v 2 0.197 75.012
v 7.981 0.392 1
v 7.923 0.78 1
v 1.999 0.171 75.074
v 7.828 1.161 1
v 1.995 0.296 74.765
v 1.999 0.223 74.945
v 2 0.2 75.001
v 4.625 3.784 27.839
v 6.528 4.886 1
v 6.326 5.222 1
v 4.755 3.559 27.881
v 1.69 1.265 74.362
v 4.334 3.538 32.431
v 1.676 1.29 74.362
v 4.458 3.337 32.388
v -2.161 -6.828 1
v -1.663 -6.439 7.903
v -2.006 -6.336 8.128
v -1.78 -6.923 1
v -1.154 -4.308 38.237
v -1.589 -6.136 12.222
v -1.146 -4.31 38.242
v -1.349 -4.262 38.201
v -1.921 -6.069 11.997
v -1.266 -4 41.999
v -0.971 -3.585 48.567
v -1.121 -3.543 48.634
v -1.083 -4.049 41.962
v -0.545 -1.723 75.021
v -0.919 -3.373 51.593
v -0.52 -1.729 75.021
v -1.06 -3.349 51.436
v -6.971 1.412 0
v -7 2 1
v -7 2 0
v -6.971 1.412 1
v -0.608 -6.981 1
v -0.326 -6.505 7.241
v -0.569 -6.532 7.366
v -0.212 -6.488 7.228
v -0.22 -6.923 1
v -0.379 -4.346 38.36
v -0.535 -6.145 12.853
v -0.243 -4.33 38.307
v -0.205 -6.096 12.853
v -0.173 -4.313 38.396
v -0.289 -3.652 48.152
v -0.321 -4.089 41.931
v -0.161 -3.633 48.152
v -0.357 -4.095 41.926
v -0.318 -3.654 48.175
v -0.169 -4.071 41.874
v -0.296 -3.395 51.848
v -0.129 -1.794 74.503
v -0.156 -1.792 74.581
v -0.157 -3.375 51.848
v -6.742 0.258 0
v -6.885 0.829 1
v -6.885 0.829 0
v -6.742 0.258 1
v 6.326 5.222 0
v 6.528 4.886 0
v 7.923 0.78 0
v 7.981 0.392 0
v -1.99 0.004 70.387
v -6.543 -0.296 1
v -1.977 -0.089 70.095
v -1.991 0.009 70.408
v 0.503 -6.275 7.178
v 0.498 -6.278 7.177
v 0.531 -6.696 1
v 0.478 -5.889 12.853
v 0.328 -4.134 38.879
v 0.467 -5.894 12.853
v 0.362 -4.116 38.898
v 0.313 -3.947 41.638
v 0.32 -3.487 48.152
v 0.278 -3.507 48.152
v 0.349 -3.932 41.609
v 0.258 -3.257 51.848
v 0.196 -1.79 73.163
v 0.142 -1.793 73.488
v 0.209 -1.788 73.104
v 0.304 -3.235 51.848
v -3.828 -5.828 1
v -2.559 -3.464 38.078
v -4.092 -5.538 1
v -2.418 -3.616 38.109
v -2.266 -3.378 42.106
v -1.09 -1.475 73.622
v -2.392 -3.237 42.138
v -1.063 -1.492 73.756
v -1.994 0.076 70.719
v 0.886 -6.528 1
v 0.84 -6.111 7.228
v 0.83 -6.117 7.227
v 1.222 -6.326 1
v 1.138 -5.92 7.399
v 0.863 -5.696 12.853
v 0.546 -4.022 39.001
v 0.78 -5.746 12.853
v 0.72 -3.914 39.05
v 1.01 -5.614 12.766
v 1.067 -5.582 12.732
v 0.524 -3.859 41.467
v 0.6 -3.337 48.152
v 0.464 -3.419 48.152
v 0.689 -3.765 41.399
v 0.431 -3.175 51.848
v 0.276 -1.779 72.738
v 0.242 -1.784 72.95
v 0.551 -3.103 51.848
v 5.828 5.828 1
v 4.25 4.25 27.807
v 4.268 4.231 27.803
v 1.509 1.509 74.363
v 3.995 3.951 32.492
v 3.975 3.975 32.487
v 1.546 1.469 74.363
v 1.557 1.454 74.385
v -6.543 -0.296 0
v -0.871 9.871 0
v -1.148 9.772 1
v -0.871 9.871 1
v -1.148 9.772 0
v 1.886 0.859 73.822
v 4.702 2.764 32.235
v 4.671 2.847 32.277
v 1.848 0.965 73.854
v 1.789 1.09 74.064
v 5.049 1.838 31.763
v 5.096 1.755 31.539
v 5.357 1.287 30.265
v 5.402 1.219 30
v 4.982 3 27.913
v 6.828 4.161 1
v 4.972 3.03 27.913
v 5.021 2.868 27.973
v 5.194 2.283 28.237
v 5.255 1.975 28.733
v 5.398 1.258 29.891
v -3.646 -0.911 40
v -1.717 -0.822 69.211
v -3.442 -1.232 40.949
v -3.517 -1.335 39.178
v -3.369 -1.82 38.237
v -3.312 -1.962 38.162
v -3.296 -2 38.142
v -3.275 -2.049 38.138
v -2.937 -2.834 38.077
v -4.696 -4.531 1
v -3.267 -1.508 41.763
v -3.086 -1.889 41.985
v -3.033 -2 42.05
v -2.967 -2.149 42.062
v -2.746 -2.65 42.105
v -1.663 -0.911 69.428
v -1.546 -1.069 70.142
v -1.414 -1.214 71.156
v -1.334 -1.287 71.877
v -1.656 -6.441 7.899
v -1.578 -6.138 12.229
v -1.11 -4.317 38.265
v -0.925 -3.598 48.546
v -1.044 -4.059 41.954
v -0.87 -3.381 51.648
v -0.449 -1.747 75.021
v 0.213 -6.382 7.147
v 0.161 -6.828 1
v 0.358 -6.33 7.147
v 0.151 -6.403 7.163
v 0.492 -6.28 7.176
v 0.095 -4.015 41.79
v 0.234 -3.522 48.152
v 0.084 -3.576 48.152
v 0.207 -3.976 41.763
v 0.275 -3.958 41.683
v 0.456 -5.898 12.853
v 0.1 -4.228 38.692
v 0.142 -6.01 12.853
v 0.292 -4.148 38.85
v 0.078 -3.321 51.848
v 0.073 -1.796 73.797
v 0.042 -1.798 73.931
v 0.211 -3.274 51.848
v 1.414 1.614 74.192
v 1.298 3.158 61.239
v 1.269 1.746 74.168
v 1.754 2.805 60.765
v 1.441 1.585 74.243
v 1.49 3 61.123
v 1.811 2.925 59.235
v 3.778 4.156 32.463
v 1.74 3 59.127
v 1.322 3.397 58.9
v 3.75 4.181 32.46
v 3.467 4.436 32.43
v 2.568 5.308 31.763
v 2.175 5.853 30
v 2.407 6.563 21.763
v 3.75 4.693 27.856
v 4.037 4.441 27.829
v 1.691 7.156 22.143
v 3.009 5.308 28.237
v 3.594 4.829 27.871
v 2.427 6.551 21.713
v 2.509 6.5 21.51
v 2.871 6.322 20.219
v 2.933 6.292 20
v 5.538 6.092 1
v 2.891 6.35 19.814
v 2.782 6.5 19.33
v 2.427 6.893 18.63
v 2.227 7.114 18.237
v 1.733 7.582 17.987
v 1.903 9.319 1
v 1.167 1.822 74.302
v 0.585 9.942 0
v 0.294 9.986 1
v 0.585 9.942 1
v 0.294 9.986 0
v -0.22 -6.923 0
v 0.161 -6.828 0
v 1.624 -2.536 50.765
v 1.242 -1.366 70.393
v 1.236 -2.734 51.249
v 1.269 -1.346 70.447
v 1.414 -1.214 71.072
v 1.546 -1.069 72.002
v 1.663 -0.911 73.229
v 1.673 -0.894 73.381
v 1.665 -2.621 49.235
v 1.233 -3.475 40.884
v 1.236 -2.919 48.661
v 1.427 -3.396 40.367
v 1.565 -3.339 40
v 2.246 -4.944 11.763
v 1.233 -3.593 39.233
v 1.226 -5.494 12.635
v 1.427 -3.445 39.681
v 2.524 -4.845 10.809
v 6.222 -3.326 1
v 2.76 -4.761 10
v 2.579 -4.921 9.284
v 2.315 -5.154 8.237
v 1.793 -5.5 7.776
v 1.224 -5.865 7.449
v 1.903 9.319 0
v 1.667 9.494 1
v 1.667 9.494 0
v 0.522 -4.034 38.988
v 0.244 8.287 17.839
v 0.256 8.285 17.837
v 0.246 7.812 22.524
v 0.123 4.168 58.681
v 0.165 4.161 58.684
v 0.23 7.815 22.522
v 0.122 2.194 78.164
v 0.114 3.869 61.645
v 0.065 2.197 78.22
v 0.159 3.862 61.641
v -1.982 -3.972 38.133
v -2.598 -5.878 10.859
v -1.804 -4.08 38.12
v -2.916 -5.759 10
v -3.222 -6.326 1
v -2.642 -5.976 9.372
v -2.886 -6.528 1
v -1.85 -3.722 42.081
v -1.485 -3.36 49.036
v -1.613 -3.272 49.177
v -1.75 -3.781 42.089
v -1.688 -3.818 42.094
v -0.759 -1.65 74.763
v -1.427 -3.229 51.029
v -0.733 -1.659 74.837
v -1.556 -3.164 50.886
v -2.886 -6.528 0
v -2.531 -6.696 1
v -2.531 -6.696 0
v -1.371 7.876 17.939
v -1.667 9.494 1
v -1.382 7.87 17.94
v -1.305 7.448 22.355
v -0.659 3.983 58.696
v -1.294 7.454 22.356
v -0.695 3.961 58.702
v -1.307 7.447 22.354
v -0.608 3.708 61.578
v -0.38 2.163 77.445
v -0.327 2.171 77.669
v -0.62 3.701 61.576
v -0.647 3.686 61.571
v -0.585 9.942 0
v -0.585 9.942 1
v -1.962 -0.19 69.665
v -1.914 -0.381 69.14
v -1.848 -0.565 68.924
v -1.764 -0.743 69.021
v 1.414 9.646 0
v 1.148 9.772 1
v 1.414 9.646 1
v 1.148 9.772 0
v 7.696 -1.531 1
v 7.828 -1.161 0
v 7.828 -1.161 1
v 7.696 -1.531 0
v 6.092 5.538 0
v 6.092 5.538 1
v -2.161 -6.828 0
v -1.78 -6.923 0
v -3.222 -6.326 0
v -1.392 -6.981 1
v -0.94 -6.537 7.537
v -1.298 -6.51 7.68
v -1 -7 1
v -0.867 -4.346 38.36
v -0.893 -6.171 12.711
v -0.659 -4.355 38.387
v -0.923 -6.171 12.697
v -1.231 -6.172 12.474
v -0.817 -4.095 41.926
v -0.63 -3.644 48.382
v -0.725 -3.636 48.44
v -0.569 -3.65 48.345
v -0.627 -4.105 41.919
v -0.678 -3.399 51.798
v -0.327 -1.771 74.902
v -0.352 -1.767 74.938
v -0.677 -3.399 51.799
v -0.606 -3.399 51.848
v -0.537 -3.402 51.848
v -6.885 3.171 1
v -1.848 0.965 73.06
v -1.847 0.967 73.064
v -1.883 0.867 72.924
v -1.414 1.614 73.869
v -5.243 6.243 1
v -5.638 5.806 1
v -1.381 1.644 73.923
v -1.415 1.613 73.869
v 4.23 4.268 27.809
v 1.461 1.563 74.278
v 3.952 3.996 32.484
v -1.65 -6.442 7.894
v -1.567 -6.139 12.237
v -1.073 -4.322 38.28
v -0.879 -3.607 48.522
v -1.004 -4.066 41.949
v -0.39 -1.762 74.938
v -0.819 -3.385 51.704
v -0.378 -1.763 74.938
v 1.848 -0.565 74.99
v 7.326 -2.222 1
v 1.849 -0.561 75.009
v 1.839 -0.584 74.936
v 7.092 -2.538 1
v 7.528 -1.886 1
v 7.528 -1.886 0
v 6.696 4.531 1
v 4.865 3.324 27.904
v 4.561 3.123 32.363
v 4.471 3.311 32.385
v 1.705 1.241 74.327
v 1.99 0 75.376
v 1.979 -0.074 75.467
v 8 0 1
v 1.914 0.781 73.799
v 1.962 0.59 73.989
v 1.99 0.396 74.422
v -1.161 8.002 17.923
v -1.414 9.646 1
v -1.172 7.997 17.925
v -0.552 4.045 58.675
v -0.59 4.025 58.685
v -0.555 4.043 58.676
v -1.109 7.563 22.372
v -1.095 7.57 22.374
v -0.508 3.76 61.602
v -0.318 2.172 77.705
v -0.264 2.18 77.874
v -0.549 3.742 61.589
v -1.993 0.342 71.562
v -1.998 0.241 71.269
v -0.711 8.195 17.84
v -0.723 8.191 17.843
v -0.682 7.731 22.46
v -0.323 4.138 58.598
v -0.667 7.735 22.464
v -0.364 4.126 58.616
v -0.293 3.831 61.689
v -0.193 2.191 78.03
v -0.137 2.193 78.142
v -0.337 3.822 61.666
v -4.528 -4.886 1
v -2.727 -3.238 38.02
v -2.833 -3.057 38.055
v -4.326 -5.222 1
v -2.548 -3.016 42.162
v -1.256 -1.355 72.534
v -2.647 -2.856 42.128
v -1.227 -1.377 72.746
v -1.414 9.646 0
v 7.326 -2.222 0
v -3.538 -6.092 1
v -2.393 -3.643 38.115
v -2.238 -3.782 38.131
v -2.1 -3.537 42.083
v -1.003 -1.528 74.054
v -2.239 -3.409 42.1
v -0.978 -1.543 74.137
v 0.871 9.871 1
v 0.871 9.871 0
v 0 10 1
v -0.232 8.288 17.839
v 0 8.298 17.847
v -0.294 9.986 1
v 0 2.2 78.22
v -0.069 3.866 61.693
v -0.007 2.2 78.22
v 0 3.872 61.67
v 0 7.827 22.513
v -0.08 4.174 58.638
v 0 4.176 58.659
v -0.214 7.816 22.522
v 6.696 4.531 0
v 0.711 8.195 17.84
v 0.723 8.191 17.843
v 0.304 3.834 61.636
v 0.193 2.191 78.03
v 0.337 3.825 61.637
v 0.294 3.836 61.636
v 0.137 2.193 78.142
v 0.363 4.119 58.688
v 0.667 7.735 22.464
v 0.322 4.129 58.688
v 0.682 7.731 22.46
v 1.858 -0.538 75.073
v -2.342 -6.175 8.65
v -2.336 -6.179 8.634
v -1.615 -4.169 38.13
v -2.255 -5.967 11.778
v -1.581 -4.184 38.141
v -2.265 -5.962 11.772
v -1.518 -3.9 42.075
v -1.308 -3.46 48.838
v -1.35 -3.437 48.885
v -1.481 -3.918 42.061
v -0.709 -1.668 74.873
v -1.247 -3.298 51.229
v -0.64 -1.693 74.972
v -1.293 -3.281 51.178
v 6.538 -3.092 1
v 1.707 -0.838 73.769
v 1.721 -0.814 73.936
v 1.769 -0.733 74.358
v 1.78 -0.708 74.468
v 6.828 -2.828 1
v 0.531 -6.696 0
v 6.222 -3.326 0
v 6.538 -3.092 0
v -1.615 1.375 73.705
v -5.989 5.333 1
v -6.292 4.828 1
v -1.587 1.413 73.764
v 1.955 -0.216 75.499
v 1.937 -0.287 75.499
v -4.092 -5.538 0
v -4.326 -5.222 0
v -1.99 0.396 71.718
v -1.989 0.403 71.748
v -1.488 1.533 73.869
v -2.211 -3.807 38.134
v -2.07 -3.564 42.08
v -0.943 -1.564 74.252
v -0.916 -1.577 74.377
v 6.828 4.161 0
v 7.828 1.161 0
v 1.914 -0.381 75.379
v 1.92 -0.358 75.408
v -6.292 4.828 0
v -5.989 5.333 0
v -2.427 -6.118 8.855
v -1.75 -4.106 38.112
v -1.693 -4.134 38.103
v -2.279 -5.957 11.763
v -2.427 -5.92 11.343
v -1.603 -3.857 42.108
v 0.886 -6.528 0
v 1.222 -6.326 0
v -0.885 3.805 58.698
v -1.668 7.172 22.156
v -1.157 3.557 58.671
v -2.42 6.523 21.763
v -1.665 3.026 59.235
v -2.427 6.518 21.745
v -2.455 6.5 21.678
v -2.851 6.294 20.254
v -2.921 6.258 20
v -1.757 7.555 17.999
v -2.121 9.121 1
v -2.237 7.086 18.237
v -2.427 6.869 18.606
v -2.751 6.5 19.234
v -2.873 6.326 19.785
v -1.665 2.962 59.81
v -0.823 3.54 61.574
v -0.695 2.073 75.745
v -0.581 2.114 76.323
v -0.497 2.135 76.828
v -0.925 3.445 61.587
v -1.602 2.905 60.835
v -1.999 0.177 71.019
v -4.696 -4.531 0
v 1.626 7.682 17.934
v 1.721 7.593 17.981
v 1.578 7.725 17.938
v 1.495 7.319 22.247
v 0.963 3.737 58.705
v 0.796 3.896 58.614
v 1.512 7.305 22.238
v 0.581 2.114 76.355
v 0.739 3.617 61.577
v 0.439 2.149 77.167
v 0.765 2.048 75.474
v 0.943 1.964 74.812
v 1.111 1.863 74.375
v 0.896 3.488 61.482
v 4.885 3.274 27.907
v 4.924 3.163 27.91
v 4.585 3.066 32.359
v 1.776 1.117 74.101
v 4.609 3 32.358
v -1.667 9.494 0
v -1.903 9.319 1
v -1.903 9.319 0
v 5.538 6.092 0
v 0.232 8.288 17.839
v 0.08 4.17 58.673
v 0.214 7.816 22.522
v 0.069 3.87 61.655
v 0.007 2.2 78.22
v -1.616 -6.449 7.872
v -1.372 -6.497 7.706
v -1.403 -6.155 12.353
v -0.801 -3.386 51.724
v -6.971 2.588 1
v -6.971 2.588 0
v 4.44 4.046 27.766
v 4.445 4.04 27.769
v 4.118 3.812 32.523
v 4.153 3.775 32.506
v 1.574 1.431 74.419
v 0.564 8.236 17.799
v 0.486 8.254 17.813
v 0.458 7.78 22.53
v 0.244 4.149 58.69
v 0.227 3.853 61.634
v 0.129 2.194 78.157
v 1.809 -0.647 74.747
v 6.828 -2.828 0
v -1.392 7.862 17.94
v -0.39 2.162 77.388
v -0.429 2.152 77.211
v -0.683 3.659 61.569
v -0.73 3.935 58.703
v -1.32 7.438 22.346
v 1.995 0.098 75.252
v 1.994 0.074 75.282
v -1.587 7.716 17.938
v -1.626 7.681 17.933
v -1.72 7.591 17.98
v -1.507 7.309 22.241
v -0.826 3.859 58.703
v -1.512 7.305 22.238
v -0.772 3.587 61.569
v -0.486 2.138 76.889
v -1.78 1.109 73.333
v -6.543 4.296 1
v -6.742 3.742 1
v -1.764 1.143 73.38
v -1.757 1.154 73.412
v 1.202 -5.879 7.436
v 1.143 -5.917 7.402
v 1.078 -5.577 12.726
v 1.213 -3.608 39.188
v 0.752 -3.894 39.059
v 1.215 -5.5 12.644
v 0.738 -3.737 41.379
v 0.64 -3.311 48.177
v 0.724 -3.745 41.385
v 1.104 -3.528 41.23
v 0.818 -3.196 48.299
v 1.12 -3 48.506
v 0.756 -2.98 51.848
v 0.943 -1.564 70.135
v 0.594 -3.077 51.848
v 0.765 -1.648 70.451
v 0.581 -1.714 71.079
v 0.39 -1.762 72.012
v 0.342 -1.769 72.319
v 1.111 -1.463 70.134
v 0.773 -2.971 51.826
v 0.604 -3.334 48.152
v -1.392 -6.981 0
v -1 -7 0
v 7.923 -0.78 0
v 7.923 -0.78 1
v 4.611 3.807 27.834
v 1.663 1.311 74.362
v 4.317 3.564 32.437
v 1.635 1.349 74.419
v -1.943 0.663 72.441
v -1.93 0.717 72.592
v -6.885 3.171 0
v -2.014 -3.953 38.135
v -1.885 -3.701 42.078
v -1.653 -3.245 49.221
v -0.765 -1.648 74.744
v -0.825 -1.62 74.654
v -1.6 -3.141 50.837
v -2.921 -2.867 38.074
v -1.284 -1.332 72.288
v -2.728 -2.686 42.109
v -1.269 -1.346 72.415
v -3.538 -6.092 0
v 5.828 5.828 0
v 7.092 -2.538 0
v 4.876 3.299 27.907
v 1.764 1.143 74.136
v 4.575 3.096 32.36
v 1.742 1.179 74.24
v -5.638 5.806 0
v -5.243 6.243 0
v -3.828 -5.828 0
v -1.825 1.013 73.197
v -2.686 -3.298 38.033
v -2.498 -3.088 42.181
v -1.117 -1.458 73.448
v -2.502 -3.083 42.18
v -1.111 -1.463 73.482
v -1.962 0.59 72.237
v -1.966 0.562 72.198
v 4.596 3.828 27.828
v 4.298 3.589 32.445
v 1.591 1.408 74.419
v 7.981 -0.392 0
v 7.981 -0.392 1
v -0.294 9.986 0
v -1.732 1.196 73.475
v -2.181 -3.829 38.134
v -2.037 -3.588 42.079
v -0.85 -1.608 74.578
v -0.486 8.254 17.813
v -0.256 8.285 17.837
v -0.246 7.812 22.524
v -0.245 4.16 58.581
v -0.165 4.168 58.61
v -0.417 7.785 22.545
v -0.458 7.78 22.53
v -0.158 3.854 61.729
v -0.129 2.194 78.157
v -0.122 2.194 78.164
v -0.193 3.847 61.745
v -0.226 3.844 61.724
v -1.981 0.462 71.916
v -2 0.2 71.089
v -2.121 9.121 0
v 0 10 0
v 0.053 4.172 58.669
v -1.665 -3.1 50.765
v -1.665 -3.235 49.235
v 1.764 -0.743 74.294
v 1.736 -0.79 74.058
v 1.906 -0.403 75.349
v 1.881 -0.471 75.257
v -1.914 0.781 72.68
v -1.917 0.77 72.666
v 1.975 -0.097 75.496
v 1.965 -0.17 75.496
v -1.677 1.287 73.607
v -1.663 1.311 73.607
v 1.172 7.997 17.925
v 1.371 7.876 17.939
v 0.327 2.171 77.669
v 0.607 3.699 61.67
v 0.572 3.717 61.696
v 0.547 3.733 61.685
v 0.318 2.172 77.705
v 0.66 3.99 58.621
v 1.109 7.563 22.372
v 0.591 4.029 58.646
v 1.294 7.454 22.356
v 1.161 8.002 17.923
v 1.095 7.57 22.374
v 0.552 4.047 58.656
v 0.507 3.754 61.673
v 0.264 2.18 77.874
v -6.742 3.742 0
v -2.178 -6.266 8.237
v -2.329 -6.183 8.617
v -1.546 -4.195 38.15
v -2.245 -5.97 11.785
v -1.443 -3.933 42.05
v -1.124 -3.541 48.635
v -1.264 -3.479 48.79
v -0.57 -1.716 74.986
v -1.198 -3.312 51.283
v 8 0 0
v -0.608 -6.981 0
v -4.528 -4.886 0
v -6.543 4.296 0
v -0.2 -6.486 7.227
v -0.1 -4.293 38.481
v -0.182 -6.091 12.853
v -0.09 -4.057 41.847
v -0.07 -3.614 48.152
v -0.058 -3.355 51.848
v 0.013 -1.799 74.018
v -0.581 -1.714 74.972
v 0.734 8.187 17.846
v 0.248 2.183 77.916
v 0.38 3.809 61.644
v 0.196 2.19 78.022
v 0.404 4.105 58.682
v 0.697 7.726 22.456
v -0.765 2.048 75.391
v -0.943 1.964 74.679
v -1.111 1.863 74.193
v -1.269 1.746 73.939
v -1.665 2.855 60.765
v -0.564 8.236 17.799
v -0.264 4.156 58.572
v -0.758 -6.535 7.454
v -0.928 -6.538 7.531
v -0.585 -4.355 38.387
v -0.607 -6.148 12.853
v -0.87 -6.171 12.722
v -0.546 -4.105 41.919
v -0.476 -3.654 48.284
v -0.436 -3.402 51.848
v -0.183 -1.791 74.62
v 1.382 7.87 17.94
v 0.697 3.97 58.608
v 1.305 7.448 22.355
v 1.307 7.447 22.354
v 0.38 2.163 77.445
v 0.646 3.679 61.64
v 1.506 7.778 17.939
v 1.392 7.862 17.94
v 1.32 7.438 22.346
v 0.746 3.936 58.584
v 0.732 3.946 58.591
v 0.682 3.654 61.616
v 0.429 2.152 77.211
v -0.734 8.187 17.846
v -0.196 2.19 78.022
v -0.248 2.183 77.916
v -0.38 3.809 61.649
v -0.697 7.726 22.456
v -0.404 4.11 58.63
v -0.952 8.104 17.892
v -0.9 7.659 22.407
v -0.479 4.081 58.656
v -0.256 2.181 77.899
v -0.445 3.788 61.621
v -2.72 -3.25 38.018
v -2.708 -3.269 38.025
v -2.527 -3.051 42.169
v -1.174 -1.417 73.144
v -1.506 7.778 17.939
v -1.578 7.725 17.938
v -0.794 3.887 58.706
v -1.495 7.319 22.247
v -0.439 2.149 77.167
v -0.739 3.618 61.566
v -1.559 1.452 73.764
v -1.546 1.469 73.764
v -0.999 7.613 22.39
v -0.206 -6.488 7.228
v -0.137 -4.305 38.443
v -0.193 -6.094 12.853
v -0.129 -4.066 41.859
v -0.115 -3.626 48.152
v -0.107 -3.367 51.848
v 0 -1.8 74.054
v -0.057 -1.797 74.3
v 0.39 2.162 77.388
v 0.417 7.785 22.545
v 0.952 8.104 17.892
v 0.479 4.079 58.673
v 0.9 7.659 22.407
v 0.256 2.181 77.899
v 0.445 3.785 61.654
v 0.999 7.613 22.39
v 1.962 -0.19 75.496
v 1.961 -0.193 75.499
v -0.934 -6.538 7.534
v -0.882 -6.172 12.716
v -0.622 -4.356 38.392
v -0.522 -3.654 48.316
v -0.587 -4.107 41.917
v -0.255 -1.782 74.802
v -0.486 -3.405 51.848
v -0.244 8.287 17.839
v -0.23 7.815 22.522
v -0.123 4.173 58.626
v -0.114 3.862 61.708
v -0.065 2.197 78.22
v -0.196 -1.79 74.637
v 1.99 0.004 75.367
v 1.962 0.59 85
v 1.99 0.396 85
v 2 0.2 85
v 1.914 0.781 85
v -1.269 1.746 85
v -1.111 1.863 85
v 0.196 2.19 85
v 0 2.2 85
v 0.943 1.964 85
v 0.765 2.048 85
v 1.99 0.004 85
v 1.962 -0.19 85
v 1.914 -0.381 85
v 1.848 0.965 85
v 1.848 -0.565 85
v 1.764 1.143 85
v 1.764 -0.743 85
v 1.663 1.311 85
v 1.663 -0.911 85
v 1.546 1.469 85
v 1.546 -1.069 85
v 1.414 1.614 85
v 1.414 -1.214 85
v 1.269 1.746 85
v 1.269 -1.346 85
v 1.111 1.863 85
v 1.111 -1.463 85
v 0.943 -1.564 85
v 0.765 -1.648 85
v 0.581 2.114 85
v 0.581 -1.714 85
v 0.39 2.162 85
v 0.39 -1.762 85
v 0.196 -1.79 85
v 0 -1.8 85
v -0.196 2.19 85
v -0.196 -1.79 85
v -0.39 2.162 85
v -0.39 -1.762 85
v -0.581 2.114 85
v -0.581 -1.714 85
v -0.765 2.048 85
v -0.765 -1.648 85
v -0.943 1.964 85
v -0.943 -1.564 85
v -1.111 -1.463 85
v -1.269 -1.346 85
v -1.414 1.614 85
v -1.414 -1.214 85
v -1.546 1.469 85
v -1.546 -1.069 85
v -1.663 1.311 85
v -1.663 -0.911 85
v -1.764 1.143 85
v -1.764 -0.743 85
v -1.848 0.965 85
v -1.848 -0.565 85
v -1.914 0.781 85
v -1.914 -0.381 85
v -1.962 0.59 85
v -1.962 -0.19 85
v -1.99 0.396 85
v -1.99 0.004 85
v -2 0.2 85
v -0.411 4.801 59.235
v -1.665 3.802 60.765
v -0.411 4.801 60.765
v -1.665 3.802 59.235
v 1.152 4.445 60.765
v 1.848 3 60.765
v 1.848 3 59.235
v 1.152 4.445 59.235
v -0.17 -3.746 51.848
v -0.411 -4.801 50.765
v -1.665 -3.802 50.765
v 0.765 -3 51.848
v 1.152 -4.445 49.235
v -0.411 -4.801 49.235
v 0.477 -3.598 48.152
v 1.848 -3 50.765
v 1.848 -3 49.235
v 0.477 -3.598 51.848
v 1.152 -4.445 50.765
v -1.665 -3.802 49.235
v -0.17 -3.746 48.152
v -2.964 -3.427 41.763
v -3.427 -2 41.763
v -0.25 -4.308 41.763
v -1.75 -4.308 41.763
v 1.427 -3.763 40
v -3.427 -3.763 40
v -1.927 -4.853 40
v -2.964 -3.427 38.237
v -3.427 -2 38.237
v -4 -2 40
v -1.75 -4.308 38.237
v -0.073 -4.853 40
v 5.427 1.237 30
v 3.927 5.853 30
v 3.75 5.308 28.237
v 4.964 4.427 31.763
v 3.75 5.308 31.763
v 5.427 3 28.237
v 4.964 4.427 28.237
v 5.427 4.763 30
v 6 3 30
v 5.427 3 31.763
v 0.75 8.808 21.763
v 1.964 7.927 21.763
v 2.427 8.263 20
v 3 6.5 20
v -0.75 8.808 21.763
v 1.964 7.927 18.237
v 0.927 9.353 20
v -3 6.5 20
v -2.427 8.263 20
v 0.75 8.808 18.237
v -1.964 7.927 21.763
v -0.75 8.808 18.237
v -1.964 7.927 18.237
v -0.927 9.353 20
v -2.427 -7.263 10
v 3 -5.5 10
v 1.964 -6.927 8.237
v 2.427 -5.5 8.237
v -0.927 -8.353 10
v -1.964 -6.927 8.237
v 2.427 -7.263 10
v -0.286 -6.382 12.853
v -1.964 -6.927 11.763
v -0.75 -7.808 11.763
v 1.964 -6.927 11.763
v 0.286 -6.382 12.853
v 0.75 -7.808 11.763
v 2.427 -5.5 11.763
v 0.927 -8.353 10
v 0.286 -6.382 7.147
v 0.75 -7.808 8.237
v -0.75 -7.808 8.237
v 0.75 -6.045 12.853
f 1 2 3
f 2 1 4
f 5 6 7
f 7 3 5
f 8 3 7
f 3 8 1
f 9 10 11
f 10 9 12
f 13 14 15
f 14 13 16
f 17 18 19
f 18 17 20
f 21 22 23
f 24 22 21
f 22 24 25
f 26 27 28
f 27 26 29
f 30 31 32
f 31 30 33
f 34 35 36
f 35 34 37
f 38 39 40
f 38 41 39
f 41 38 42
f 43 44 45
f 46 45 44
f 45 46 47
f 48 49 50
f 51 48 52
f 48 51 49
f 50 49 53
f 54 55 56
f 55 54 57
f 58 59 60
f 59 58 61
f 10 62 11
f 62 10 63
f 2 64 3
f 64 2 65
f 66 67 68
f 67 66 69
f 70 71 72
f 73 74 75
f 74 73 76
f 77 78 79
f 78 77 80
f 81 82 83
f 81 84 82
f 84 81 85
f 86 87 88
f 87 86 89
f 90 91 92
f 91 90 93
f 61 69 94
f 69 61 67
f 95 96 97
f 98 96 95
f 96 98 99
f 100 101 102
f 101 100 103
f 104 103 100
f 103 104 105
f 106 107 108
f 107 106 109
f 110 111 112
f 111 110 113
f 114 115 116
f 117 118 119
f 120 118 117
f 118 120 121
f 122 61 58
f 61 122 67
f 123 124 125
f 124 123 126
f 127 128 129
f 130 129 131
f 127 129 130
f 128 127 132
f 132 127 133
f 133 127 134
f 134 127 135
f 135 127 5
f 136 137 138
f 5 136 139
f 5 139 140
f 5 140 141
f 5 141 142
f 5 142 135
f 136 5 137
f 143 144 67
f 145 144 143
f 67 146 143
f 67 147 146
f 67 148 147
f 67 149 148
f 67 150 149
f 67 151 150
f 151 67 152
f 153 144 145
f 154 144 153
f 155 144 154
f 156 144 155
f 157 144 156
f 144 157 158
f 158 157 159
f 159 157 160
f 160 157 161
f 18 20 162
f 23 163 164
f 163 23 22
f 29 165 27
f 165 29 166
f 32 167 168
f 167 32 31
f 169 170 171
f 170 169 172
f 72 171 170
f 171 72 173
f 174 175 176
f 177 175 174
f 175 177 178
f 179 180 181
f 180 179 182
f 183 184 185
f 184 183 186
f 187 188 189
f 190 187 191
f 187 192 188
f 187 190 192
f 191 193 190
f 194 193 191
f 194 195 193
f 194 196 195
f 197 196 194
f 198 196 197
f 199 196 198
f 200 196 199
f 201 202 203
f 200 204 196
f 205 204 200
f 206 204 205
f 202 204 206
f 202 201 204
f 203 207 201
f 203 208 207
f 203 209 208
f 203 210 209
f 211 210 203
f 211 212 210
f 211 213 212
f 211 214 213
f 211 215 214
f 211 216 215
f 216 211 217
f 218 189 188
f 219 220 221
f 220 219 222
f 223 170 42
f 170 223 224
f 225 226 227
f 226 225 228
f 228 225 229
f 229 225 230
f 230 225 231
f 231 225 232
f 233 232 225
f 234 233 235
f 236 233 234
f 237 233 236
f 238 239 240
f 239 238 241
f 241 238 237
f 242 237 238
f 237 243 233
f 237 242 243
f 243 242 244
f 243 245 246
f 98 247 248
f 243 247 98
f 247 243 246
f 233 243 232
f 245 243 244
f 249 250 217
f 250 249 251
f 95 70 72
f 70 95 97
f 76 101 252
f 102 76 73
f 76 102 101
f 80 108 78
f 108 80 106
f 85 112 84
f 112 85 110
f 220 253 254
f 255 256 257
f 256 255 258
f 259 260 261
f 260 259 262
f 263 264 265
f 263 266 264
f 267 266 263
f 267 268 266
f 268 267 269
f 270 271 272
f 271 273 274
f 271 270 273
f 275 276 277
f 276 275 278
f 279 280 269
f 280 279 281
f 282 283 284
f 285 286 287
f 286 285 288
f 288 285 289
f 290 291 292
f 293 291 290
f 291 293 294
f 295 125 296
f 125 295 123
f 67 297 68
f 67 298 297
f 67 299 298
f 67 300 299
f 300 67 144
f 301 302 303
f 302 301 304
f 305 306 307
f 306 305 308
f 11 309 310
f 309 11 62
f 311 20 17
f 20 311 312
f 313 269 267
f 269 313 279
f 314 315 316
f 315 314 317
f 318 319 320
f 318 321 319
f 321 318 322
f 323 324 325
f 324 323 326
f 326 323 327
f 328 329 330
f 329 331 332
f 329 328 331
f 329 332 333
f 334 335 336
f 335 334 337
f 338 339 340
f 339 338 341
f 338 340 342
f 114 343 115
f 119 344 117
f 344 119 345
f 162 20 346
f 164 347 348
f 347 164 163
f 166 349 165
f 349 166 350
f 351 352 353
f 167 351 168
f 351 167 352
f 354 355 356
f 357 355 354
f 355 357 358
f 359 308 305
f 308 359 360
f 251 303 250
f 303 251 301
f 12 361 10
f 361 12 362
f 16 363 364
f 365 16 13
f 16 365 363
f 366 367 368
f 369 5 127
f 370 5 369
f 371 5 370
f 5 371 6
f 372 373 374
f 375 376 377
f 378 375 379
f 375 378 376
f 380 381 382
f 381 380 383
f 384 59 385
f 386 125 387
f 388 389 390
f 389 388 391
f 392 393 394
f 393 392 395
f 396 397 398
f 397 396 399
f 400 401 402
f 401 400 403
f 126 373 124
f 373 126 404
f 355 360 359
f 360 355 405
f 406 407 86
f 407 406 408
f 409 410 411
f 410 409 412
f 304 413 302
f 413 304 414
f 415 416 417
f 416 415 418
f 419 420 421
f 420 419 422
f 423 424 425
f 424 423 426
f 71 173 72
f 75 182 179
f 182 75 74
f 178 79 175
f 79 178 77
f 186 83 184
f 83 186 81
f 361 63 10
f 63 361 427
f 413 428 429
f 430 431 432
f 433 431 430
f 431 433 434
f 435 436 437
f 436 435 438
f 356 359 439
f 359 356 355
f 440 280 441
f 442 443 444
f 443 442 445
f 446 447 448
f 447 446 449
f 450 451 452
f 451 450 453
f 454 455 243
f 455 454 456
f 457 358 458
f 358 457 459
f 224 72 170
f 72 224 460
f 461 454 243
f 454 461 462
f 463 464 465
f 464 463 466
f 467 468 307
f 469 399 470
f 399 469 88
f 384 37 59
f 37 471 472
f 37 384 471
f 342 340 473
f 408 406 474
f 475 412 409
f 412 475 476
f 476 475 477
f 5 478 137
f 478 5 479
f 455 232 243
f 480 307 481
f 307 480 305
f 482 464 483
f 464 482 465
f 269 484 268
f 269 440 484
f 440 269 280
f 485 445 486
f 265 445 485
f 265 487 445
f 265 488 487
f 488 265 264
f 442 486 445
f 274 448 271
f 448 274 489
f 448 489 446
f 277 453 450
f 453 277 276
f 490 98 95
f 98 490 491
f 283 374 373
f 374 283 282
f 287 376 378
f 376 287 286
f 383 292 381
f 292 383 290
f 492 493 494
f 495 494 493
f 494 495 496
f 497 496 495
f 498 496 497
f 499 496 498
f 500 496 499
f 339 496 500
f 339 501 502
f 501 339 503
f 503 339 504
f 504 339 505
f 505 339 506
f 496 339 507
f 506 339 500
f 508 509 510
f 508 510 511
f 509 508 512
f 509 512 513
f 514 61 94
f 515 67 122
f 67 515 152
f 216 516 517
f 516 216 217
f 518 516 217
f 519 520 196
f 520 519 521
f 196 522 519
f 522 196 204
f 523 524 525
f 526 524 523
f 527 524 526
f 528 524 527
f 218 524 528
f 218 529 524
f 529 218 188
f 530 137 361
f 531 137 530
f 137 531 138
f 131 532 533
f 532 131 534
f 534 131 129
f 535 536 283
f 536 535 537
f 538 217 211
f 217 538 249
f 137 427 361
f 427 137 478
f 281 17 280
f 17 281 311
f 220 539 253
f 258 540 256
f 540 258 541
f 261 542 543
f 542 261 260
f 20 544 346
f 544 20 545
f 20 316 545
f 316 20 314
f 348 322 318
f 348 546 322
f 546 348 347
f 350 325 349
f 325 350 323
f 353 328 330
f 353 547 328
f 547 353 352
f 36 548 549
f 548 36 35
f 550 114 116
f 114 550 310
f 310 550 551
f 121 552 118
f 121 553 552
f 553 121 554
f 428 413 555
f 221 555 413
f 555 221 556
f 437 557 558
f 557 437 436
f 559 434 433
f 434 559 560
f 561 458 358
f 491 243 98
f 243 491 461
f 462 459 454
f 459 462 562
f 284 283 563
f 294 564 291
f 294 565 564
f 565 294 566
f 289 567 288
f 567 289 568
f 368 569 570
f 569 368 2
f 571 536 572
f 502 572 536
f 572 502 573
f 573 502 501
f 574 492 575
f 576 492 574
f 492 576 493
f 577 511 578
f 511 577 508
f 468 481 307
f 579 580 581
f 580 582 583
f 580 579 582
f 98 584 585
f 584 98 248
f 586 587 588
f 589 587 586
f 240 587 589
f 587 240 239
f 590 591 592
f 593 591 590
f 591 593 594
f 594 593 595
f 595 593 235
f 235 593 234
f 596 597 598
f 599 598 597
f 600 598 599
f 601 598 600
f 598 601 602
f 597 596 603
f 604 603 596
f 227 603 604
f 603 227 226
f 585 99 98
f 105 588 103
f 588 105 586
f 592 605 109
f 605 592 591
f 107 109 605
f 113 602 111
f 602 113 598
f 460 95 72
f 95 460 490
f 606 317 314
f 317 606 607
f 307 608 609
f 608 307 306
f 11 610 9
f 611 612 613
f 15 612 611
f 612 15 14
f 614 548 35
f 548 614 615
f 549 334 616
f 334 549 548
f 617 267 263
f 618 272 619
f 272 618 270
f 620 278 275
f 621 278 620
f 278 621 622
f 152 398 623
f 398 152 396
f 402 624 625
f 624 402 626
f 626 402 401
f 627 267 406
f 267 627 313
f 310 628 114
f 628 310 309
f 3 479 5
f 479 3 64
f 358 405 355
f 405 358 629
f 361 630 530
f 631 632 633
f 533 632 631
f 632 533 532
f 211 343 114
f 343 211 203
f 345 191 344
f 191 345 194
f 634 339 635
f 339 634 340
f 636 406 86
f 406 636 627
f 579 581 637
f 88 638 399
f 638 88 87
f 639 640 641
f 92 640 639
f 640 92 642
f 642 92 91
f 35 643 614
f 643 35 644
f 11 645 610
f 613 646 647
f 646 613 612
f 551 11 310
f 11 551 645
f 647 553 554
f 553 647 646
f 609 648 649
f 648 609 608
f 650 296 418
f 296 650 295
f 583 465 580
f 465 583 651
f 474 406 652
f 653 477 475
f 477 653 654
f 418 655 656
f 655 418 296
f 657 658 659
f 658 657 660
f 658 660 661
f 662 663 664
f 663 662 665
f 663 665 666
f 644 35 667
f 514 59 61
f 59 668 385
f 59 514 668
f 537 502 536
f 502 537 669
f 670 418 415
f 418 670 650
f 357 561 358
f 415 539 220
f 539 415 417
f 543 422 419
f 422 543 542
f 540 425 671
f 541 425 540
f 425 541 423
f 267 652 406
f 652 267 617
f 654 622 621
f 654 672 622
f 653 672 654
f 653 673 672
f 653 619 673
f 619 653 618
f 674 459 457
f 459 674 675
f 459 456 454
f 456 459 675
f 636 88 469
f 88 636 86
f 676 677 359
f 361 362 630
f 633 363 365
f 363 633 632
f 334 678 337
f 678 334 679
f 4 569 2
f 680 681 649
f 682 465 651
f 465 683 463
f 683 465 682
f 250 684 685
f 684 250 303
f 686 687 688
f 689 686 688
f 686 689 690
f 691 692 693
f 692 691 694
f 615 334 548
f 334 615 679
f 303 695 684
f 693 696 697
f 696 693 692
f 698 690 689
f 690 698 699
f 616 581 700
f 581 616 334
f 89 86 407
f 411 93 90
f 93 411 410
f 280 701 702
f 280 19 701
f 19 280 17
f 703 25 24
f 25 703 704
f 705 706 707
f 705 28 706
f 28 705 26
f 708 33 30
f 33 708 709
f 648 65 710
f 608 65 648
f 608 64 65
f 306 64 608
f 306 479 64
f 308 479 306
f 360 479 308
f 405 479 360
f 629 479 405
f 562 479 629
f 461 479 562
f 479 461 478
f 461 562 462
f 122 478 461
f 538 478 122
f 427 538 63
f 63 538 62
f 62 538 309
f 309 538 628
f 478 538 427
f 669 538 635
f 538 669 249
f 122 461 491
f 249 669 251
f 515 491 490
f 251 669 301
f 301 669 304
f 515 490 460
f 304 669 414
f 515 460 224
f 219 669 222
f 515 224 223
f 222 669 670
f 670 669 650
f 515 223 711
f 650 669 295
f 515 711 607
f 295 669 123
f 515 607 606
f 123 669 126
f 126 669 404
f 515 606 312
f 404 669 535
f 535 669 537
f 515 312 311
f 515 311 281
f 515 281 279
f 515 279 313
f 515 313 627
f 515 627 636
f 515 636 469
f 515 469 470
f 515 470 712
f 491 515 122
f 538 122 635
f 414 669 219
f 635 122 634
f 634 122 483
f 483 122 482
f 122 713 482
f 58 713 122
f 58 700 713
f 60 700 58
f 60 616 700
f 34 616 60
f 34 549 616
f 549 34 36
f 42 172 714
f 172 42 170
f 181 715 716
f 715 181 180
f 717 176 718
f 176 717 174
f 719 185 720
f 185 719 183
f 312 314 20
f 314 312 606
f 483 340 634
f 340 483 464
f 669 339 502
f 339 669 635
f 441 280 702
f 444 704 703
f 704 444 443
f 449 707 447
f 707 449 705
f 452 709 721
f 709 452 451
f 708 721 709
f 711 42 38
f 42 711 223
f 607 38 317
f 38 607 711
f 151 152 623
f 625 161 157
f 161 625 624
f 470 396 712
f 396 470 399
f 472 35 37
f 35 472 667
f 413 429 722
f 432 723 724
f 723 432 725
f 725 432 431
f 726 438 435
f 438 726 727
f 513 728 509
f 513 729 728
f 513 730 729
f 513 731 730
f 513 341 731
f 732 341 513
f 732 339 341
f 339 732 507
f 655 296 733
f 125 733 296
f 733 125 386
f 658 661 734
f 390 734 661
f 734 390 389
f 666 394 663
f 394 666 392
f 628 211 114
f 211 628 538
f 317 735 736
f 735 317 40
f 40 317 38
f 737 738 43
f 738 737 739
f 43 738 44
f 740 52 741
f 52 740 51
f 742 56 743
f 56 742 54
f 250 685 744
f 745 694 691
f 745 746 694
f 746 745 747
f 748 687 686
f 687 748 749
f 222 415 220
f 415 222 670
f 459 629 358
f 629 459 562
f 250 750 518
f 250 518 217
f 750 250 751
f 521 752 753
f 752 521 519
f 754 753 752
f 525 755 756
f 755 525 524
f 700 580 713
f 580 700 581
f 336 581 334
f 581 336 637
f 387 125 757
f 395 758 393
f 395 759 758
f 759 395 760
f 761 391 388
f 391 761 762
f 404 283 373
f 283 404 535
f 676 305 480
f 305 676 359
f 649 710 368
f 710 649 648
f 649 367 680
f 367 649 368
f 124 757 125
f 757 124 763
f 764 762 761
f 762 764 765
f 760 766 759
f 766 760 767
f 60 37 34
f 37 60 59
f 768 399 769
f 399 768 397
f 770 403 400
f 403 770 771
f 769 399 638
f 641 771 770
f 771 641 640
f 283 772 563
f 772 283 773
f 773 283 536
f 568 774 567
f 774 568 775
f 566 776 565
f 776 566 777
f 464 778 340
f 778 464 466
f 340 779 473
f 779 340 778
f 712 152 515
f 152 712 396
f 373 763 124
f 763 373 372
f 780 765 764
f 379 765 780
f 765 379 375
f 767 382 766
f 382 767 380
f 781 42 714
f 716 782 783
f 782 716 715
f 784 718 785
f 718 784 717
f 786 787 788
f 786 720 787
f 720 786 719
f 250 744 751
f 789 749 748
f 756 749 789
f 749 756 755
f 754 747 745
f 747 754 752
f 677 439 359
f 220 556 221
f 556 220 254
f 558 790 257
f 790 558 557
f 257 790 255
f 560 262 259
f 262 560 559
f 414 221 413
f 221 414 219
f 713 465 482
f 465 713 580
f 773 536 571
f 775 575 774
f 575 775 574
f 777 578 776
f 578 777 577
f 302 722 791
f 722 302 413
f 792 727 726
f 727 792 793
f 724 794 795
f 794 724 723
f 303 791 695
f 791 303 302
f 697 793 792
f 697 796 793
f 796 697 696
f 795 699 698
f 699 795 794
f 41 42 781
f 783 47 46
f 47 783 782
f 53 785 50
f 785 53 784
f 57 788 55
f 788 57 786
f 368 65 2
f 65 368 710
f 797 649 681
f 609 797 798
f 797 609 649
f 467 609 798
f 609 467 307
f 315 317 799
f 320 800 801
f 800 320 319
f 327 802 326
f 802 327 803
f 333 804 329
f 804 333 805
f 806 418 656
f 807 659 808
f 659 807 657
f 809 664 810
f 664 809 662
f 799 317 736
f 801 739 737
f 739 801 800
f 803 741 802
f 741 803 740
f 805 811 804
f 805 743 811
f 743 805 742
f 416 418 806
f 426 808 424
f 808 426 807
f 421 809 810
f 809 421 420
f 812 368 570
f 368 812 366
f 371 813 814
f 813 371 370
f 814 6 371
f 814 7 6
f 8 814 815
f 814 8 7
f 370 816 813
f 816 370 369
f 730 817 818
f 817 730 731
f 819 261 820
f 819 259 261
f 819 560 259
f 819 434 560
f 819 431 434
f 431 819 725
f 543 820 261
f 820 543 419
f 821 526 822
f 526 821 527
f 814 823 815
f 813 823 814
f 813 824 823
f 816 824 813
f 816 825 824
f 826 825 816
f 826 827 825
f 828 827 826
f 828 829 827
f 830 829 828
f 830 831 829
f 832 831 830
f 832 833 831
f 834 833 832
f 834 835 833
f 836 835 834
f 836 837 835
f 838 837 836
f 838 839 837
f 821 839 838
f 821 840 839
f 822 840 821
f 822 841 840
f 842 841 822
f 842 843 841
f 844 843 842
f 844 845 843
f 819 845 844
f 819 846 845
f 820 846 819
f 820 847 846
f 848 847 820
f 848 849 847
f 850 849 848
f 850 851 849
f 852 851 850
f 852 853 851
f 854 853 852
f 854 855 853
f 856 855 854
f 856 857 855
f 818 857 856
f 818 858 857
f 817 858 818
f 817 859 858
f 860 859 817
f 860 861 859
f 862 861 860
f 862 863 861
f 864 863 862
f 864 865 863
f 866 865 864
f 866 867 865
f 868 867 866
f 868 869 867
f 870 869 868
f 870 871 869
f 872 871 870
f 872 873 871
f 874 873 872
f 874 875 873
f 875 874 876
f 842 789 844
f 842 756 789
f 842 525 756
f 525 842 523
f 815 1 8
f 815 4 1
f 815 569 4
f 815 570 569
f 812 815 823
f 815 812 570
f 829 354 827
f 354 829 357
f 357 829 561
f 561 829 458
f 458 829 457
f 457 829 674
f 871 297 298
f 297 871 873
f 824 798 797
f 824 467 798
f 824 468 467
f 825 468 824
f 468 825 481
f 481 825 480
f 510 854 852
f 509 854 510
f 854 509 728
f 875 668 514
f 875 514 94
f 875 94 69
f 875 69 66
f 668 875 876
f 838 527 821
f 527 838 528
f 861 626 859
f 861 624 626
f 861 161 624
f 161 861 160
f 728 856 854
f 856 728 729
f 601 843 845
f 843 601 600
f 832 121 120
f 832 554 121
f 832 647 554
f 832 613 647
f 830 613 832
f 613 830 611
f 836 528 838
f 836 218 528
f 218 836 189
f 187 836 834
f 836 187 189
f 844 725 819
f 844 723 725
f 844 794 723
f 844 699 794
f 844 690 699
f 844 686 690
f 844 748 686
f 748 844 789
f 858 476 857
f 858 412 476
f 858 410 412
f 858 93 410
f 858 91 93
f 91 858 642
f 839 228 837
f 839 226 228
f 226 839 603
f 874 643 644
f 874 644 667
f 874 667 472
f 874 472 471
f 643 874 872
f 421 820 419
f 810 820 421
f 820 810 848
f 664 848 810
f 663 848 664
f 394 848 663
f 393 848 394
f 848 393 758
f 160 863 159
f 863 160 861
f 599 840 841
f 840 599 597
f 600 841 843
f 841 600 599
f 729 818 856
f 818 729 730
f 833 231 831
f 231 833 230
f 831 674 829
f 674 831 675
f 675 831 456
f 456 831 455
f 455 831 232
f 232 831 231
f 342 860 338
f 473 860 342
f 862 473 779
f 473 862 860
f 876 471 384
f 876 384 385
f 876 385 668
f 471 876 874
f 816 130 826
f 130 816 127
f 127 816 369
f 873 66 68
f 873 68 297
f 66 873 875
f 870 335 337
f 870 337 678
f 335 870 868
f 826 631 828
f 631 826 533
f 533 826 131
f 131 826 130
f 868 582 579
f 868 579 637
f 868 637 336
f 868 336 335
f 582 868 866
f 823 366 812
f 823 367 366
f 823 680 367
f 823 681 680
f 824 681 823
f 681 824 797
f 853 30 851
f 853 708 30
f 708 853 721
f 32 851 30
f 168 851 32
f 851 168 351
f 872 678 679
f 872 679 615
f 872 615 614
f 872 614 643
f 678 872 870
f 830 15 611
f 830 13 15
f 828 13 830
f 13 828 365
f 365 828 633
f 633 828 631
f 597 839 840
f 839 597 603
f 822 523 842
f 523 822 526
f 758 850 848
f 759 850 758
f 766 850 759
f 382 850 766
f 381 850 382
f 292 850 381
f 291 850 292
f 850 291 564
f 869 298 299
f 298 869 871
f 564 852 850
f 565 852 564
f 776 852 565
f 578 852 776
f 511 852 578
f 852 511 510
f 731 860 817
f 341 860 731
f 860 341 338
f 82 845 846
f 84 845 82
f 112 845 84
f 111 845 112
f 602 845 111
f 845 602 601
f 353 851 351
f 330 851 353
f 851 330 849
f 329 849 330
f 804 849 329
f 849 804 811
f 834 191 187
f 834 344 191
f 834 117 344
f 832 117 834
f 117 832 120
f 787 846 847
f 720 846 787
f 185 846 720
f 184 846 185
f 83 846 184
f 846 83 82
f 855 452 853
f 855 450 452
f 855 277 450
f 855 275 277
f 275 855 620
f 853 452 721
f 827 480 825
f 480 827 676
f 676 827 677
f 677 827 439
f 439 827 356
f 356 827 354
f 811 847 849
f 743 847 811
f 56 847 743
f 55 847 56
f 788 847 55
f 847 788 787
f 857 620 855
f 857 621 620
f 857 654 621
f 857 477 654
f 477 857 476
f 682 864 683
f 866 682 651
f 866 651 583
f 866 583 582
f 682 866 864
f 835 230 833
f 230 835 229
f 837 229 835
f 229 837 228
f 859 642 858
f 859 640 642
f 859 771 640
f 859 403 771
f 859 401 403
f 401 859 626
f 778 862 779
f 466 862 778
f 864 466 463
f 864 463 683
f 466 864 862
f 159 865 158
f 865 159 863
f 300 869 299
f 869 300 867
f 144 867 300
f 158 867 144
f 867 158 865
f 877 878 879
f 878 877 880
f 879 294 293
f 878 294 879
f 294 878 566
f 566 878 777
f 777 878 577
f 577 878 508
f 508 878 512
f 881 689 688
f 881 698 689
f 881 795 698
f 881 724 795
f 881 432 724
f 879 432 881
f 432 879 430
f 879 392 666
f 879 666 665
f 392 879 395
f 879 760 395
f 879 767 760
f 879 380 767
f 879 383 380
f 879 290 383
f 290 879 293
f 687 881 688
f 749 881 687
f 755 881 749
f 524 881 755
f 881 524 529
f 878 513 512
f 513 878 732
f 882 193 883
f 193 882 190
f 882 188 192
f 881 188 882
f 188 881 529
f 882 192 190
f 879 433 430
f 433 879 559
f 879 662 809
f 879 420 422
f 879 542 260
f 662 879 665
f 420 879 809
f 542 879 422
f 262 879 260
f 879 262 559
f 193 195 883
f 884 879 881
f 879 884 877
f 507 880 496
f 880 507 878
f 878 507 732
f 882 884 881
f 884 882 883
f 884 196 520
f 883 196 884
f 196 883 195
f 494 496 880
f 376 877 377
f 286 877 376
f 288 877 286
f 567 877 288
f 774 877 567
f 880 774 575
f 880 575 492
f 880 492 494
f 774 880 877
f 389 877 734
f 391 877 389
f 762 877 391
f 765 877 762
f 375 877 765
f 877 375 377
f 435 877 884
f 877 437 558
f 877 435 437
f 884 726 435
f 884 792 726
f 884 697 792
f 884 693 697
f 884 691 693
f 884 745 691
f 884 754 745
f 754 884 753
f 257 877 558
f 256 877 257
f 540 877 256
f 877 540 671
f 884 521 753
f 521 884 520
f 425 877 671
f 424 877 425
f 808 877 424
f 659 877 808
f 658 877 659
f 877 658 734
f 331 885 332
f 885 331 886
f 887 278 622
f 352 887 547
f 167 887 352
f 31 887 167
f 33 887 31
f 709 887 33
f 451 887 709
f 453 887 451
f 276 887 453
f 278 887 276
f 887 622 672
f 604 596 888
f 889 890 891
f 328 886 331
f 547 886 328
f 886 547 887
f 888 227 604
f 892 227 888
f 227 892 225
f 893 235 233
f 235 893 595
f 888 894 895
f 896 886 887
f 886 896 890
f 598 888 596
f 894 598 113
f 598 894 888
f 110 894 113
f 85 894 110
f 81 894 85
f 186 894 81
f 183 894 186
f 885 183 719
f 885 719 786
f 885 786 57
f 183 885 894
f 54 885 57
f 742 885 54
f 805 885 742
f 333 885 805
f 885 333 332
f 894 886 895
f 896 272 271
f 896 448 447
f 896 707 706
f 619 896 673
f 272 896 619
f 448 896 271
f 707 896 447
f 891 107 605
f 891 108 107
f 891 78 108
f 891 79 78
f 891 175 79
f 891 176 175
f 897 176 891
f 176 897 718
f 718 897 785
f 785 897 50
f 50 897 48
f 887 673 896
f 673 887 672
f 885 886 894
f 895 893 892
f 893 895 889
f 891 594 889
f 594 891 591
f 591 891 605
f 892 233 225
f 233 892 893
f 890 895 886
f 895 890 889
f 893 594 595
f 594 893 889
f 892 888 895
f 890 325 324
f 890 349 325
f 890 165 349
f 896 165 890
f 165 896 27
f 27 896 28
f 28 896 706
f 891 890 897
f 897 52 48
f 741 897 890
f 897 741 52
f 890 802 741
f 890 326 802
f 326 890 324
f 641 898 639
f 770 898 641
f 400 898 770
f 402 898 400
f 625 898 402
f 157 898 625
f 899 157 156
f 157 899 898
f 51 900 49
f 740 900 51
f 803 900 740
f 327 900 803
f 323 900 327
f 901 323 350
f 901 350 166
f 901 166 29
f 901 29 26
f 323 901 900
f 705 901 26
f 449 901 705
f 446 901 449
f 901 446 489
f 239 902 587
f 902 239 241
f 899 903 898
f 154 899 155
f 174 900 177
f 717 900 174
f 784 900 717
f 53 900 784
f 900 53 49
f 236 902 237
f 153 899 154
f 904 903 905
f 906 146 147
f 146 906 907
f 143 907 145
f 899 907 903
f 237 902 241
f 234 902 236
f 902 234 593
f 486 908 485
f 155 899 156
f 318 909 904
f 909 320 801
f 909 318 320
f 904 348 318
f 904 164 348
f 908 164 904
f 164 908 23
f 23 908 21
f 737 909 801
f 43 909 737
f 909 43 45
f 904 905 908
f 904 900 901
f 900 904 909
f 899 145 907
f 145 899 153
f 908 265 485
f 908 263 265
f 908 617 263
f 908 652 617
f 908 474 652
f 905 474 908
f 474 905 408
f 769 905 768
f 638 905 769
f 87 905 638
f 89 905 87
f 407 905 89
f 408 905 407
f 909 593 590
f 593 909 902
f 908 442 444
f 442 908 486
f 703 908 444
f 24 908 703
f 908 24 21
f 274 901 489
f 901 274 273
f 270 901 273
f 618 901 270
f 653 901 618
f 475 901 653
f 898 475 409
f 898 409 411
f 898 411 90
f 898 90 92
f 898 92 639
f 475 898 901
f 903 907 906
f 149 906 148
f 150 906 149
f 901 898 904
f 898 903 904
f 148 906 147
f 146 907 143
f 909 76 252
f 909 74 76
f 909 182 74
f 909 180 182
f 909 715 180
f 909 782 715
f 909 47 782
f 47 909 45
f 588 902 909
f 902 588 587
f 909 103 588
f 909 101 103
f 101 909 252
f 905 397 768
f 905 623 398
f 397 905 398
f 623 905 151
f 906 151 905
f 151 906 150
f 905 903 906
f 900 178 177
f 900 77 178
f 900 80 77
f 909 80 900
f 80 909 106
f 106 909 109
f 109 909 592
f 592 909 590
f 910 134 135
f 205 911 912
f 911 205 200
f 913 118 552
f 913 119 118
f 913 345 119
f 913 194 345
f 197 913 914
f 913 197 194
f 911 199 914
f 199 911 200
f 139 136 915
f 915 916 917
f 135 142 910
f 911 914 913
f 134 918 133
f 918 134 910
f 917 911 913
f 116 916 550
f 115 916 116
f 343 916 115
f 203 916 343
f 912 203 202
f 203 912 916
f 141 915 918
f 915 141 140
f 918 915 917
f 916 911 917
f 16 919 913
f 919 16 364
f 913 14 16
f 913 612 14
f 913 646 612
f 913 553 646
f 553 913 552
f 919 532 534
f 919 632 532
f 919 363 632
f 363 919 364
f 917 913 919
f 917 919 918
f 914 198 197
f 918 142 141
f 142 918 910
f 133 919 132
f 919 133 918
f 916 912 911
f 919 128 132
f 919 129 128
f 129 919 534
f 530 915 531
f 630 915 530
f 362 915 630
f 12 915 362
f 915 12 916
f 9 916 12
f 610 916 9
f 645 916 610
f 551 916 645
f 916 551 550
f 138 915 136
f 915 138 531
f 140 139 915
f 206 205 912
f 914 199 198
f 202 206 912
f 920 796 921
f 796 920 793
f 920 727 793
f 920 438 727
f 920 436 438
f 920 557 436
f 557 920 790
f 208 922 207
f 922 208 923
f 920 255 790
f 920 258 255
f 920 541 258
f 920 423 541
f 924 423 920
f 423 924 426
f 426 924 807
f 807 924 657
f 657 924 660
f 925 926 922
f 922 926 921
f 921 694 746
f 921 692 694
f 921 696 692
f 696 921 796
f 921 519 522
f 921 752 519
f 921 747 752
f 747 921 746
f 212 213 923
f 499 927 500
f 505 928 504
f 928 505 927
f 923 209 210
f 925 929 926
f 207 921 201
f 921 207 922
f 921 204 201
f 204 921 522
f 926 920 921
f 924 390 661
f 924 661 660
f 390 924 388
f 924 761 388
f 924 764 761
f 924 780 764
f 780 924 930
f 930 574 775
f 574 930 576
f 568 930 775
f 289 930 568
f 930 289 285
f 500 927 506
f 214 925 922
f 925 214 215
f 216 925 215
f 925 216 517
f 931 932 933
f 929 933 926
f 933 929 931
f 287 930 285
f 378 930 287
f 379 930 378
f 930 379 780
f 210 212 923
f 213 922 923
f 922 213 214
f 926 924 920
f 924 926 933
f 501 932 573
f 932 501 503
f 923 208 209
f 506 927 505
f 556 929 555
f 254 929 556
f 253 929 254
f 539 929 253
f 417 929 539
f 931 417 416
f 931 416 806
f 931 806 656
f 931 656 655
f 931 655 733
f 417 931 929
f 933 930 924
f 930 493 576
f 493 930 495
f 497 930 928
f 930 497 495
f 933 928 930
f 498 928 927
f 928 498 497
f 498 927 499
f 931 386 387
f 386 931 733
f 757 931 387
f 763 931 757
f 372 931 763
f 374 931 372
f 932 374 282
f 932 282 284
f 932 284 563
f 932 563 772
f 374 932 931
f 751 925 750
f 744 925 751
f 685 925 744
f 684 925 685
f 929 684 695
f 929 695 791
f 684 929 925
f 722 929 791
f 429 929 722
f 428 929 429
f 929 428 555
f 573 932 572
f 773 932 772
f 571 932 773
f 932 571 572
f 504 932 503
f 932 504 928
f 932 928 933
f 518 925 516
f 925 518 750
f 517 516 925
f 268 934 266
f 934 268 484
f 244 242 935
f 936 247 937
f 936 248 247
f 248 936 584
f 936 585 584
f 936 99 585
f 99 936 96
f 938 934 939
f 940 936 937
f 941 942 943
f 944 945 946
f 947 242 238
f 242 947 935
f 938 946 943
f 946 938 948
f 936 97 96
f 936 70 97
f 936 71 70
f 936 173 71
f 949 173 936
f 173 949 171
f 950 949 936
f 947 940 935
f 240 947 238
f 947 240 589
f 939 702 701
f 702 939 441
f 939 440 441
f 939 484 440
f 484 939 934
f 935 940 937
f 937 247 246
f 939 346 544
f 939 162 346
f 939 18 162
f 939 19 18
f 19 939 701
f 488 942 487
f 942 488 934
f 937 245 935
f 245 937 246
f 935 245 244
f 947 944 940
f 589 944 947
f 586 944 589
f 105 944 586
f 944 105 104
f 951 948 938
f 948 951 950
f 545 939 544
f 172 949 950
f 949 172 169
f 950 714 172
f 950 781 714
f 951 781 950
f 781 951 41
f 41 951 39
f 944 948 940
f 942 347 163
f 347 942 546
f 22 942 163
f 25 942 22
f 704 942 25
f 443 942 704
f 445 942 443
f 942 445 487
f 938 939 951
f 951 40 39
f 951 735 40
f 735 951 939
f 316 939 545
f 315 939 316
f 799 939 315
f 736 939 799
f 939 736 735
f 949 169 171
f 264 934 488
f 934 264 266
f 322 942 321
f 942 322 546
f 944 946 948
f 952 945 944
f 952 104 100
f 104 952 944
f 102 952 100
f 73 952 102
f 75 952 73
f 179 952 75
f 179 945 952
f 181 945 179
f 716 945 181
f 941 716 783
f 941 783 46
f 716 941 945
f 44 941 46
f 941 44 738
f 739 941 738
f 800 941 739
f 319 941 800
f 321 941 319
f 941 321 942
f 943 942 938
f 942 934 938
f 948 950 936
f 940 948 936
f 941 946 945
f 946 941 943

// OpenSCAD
cylinder(h = 20, r = 1.8, $fn = 64);

module kleks() {
  translate([4, 0, 0]) {
    cylinder(h = 1, r = 4, $fn = 64);
  }
  translate([3, 3, 0]) {
    cylinder(h = 1, r = 4, $fn = 64);
  }
  translate([-1, -3, 0]) {
    cylinder(h = 1, r = 4, $fn = 64);
  }
  translate([-1, 2, 0]) {
    cylinder(h = 1, r = 6, $fn = 64);
  }
  translate([0, 7, 0]) {
    cylinder(h = 1, r = 3, $fn = 64);
  }
}

translate([0, 0, 5]) {
  cylinder(h = 80, r1 = 2, r2 = 10, $fn = 64);
}

module promien() {
  hull() {
    kleks();
    translate([0, 0, 80]) {
      scale([0.2, 0.2, 0.2]) kleks();
    }
  }

  translate([0, 0.2, 65]) {
    cylinder(h = 20, r = 2, $fn = 64);
  }

  translate([0, 3, 60]) {
    sphere(r = 2);
  };
  translate([0, -3, 50]) {
    sphere(r = 2);
  };
  translate([-1, -2, 40]) {
    sphere(r = 3);
  };
  translate([3, 3, 30]) {
    sphere(r = 3);
  };
  translate([0, 6.5, 20]) {
    sphere(r = 3);
  };
  translate([0, -5.5, 10]) {
    sphere(r = 3);
  };
}

!promien();
